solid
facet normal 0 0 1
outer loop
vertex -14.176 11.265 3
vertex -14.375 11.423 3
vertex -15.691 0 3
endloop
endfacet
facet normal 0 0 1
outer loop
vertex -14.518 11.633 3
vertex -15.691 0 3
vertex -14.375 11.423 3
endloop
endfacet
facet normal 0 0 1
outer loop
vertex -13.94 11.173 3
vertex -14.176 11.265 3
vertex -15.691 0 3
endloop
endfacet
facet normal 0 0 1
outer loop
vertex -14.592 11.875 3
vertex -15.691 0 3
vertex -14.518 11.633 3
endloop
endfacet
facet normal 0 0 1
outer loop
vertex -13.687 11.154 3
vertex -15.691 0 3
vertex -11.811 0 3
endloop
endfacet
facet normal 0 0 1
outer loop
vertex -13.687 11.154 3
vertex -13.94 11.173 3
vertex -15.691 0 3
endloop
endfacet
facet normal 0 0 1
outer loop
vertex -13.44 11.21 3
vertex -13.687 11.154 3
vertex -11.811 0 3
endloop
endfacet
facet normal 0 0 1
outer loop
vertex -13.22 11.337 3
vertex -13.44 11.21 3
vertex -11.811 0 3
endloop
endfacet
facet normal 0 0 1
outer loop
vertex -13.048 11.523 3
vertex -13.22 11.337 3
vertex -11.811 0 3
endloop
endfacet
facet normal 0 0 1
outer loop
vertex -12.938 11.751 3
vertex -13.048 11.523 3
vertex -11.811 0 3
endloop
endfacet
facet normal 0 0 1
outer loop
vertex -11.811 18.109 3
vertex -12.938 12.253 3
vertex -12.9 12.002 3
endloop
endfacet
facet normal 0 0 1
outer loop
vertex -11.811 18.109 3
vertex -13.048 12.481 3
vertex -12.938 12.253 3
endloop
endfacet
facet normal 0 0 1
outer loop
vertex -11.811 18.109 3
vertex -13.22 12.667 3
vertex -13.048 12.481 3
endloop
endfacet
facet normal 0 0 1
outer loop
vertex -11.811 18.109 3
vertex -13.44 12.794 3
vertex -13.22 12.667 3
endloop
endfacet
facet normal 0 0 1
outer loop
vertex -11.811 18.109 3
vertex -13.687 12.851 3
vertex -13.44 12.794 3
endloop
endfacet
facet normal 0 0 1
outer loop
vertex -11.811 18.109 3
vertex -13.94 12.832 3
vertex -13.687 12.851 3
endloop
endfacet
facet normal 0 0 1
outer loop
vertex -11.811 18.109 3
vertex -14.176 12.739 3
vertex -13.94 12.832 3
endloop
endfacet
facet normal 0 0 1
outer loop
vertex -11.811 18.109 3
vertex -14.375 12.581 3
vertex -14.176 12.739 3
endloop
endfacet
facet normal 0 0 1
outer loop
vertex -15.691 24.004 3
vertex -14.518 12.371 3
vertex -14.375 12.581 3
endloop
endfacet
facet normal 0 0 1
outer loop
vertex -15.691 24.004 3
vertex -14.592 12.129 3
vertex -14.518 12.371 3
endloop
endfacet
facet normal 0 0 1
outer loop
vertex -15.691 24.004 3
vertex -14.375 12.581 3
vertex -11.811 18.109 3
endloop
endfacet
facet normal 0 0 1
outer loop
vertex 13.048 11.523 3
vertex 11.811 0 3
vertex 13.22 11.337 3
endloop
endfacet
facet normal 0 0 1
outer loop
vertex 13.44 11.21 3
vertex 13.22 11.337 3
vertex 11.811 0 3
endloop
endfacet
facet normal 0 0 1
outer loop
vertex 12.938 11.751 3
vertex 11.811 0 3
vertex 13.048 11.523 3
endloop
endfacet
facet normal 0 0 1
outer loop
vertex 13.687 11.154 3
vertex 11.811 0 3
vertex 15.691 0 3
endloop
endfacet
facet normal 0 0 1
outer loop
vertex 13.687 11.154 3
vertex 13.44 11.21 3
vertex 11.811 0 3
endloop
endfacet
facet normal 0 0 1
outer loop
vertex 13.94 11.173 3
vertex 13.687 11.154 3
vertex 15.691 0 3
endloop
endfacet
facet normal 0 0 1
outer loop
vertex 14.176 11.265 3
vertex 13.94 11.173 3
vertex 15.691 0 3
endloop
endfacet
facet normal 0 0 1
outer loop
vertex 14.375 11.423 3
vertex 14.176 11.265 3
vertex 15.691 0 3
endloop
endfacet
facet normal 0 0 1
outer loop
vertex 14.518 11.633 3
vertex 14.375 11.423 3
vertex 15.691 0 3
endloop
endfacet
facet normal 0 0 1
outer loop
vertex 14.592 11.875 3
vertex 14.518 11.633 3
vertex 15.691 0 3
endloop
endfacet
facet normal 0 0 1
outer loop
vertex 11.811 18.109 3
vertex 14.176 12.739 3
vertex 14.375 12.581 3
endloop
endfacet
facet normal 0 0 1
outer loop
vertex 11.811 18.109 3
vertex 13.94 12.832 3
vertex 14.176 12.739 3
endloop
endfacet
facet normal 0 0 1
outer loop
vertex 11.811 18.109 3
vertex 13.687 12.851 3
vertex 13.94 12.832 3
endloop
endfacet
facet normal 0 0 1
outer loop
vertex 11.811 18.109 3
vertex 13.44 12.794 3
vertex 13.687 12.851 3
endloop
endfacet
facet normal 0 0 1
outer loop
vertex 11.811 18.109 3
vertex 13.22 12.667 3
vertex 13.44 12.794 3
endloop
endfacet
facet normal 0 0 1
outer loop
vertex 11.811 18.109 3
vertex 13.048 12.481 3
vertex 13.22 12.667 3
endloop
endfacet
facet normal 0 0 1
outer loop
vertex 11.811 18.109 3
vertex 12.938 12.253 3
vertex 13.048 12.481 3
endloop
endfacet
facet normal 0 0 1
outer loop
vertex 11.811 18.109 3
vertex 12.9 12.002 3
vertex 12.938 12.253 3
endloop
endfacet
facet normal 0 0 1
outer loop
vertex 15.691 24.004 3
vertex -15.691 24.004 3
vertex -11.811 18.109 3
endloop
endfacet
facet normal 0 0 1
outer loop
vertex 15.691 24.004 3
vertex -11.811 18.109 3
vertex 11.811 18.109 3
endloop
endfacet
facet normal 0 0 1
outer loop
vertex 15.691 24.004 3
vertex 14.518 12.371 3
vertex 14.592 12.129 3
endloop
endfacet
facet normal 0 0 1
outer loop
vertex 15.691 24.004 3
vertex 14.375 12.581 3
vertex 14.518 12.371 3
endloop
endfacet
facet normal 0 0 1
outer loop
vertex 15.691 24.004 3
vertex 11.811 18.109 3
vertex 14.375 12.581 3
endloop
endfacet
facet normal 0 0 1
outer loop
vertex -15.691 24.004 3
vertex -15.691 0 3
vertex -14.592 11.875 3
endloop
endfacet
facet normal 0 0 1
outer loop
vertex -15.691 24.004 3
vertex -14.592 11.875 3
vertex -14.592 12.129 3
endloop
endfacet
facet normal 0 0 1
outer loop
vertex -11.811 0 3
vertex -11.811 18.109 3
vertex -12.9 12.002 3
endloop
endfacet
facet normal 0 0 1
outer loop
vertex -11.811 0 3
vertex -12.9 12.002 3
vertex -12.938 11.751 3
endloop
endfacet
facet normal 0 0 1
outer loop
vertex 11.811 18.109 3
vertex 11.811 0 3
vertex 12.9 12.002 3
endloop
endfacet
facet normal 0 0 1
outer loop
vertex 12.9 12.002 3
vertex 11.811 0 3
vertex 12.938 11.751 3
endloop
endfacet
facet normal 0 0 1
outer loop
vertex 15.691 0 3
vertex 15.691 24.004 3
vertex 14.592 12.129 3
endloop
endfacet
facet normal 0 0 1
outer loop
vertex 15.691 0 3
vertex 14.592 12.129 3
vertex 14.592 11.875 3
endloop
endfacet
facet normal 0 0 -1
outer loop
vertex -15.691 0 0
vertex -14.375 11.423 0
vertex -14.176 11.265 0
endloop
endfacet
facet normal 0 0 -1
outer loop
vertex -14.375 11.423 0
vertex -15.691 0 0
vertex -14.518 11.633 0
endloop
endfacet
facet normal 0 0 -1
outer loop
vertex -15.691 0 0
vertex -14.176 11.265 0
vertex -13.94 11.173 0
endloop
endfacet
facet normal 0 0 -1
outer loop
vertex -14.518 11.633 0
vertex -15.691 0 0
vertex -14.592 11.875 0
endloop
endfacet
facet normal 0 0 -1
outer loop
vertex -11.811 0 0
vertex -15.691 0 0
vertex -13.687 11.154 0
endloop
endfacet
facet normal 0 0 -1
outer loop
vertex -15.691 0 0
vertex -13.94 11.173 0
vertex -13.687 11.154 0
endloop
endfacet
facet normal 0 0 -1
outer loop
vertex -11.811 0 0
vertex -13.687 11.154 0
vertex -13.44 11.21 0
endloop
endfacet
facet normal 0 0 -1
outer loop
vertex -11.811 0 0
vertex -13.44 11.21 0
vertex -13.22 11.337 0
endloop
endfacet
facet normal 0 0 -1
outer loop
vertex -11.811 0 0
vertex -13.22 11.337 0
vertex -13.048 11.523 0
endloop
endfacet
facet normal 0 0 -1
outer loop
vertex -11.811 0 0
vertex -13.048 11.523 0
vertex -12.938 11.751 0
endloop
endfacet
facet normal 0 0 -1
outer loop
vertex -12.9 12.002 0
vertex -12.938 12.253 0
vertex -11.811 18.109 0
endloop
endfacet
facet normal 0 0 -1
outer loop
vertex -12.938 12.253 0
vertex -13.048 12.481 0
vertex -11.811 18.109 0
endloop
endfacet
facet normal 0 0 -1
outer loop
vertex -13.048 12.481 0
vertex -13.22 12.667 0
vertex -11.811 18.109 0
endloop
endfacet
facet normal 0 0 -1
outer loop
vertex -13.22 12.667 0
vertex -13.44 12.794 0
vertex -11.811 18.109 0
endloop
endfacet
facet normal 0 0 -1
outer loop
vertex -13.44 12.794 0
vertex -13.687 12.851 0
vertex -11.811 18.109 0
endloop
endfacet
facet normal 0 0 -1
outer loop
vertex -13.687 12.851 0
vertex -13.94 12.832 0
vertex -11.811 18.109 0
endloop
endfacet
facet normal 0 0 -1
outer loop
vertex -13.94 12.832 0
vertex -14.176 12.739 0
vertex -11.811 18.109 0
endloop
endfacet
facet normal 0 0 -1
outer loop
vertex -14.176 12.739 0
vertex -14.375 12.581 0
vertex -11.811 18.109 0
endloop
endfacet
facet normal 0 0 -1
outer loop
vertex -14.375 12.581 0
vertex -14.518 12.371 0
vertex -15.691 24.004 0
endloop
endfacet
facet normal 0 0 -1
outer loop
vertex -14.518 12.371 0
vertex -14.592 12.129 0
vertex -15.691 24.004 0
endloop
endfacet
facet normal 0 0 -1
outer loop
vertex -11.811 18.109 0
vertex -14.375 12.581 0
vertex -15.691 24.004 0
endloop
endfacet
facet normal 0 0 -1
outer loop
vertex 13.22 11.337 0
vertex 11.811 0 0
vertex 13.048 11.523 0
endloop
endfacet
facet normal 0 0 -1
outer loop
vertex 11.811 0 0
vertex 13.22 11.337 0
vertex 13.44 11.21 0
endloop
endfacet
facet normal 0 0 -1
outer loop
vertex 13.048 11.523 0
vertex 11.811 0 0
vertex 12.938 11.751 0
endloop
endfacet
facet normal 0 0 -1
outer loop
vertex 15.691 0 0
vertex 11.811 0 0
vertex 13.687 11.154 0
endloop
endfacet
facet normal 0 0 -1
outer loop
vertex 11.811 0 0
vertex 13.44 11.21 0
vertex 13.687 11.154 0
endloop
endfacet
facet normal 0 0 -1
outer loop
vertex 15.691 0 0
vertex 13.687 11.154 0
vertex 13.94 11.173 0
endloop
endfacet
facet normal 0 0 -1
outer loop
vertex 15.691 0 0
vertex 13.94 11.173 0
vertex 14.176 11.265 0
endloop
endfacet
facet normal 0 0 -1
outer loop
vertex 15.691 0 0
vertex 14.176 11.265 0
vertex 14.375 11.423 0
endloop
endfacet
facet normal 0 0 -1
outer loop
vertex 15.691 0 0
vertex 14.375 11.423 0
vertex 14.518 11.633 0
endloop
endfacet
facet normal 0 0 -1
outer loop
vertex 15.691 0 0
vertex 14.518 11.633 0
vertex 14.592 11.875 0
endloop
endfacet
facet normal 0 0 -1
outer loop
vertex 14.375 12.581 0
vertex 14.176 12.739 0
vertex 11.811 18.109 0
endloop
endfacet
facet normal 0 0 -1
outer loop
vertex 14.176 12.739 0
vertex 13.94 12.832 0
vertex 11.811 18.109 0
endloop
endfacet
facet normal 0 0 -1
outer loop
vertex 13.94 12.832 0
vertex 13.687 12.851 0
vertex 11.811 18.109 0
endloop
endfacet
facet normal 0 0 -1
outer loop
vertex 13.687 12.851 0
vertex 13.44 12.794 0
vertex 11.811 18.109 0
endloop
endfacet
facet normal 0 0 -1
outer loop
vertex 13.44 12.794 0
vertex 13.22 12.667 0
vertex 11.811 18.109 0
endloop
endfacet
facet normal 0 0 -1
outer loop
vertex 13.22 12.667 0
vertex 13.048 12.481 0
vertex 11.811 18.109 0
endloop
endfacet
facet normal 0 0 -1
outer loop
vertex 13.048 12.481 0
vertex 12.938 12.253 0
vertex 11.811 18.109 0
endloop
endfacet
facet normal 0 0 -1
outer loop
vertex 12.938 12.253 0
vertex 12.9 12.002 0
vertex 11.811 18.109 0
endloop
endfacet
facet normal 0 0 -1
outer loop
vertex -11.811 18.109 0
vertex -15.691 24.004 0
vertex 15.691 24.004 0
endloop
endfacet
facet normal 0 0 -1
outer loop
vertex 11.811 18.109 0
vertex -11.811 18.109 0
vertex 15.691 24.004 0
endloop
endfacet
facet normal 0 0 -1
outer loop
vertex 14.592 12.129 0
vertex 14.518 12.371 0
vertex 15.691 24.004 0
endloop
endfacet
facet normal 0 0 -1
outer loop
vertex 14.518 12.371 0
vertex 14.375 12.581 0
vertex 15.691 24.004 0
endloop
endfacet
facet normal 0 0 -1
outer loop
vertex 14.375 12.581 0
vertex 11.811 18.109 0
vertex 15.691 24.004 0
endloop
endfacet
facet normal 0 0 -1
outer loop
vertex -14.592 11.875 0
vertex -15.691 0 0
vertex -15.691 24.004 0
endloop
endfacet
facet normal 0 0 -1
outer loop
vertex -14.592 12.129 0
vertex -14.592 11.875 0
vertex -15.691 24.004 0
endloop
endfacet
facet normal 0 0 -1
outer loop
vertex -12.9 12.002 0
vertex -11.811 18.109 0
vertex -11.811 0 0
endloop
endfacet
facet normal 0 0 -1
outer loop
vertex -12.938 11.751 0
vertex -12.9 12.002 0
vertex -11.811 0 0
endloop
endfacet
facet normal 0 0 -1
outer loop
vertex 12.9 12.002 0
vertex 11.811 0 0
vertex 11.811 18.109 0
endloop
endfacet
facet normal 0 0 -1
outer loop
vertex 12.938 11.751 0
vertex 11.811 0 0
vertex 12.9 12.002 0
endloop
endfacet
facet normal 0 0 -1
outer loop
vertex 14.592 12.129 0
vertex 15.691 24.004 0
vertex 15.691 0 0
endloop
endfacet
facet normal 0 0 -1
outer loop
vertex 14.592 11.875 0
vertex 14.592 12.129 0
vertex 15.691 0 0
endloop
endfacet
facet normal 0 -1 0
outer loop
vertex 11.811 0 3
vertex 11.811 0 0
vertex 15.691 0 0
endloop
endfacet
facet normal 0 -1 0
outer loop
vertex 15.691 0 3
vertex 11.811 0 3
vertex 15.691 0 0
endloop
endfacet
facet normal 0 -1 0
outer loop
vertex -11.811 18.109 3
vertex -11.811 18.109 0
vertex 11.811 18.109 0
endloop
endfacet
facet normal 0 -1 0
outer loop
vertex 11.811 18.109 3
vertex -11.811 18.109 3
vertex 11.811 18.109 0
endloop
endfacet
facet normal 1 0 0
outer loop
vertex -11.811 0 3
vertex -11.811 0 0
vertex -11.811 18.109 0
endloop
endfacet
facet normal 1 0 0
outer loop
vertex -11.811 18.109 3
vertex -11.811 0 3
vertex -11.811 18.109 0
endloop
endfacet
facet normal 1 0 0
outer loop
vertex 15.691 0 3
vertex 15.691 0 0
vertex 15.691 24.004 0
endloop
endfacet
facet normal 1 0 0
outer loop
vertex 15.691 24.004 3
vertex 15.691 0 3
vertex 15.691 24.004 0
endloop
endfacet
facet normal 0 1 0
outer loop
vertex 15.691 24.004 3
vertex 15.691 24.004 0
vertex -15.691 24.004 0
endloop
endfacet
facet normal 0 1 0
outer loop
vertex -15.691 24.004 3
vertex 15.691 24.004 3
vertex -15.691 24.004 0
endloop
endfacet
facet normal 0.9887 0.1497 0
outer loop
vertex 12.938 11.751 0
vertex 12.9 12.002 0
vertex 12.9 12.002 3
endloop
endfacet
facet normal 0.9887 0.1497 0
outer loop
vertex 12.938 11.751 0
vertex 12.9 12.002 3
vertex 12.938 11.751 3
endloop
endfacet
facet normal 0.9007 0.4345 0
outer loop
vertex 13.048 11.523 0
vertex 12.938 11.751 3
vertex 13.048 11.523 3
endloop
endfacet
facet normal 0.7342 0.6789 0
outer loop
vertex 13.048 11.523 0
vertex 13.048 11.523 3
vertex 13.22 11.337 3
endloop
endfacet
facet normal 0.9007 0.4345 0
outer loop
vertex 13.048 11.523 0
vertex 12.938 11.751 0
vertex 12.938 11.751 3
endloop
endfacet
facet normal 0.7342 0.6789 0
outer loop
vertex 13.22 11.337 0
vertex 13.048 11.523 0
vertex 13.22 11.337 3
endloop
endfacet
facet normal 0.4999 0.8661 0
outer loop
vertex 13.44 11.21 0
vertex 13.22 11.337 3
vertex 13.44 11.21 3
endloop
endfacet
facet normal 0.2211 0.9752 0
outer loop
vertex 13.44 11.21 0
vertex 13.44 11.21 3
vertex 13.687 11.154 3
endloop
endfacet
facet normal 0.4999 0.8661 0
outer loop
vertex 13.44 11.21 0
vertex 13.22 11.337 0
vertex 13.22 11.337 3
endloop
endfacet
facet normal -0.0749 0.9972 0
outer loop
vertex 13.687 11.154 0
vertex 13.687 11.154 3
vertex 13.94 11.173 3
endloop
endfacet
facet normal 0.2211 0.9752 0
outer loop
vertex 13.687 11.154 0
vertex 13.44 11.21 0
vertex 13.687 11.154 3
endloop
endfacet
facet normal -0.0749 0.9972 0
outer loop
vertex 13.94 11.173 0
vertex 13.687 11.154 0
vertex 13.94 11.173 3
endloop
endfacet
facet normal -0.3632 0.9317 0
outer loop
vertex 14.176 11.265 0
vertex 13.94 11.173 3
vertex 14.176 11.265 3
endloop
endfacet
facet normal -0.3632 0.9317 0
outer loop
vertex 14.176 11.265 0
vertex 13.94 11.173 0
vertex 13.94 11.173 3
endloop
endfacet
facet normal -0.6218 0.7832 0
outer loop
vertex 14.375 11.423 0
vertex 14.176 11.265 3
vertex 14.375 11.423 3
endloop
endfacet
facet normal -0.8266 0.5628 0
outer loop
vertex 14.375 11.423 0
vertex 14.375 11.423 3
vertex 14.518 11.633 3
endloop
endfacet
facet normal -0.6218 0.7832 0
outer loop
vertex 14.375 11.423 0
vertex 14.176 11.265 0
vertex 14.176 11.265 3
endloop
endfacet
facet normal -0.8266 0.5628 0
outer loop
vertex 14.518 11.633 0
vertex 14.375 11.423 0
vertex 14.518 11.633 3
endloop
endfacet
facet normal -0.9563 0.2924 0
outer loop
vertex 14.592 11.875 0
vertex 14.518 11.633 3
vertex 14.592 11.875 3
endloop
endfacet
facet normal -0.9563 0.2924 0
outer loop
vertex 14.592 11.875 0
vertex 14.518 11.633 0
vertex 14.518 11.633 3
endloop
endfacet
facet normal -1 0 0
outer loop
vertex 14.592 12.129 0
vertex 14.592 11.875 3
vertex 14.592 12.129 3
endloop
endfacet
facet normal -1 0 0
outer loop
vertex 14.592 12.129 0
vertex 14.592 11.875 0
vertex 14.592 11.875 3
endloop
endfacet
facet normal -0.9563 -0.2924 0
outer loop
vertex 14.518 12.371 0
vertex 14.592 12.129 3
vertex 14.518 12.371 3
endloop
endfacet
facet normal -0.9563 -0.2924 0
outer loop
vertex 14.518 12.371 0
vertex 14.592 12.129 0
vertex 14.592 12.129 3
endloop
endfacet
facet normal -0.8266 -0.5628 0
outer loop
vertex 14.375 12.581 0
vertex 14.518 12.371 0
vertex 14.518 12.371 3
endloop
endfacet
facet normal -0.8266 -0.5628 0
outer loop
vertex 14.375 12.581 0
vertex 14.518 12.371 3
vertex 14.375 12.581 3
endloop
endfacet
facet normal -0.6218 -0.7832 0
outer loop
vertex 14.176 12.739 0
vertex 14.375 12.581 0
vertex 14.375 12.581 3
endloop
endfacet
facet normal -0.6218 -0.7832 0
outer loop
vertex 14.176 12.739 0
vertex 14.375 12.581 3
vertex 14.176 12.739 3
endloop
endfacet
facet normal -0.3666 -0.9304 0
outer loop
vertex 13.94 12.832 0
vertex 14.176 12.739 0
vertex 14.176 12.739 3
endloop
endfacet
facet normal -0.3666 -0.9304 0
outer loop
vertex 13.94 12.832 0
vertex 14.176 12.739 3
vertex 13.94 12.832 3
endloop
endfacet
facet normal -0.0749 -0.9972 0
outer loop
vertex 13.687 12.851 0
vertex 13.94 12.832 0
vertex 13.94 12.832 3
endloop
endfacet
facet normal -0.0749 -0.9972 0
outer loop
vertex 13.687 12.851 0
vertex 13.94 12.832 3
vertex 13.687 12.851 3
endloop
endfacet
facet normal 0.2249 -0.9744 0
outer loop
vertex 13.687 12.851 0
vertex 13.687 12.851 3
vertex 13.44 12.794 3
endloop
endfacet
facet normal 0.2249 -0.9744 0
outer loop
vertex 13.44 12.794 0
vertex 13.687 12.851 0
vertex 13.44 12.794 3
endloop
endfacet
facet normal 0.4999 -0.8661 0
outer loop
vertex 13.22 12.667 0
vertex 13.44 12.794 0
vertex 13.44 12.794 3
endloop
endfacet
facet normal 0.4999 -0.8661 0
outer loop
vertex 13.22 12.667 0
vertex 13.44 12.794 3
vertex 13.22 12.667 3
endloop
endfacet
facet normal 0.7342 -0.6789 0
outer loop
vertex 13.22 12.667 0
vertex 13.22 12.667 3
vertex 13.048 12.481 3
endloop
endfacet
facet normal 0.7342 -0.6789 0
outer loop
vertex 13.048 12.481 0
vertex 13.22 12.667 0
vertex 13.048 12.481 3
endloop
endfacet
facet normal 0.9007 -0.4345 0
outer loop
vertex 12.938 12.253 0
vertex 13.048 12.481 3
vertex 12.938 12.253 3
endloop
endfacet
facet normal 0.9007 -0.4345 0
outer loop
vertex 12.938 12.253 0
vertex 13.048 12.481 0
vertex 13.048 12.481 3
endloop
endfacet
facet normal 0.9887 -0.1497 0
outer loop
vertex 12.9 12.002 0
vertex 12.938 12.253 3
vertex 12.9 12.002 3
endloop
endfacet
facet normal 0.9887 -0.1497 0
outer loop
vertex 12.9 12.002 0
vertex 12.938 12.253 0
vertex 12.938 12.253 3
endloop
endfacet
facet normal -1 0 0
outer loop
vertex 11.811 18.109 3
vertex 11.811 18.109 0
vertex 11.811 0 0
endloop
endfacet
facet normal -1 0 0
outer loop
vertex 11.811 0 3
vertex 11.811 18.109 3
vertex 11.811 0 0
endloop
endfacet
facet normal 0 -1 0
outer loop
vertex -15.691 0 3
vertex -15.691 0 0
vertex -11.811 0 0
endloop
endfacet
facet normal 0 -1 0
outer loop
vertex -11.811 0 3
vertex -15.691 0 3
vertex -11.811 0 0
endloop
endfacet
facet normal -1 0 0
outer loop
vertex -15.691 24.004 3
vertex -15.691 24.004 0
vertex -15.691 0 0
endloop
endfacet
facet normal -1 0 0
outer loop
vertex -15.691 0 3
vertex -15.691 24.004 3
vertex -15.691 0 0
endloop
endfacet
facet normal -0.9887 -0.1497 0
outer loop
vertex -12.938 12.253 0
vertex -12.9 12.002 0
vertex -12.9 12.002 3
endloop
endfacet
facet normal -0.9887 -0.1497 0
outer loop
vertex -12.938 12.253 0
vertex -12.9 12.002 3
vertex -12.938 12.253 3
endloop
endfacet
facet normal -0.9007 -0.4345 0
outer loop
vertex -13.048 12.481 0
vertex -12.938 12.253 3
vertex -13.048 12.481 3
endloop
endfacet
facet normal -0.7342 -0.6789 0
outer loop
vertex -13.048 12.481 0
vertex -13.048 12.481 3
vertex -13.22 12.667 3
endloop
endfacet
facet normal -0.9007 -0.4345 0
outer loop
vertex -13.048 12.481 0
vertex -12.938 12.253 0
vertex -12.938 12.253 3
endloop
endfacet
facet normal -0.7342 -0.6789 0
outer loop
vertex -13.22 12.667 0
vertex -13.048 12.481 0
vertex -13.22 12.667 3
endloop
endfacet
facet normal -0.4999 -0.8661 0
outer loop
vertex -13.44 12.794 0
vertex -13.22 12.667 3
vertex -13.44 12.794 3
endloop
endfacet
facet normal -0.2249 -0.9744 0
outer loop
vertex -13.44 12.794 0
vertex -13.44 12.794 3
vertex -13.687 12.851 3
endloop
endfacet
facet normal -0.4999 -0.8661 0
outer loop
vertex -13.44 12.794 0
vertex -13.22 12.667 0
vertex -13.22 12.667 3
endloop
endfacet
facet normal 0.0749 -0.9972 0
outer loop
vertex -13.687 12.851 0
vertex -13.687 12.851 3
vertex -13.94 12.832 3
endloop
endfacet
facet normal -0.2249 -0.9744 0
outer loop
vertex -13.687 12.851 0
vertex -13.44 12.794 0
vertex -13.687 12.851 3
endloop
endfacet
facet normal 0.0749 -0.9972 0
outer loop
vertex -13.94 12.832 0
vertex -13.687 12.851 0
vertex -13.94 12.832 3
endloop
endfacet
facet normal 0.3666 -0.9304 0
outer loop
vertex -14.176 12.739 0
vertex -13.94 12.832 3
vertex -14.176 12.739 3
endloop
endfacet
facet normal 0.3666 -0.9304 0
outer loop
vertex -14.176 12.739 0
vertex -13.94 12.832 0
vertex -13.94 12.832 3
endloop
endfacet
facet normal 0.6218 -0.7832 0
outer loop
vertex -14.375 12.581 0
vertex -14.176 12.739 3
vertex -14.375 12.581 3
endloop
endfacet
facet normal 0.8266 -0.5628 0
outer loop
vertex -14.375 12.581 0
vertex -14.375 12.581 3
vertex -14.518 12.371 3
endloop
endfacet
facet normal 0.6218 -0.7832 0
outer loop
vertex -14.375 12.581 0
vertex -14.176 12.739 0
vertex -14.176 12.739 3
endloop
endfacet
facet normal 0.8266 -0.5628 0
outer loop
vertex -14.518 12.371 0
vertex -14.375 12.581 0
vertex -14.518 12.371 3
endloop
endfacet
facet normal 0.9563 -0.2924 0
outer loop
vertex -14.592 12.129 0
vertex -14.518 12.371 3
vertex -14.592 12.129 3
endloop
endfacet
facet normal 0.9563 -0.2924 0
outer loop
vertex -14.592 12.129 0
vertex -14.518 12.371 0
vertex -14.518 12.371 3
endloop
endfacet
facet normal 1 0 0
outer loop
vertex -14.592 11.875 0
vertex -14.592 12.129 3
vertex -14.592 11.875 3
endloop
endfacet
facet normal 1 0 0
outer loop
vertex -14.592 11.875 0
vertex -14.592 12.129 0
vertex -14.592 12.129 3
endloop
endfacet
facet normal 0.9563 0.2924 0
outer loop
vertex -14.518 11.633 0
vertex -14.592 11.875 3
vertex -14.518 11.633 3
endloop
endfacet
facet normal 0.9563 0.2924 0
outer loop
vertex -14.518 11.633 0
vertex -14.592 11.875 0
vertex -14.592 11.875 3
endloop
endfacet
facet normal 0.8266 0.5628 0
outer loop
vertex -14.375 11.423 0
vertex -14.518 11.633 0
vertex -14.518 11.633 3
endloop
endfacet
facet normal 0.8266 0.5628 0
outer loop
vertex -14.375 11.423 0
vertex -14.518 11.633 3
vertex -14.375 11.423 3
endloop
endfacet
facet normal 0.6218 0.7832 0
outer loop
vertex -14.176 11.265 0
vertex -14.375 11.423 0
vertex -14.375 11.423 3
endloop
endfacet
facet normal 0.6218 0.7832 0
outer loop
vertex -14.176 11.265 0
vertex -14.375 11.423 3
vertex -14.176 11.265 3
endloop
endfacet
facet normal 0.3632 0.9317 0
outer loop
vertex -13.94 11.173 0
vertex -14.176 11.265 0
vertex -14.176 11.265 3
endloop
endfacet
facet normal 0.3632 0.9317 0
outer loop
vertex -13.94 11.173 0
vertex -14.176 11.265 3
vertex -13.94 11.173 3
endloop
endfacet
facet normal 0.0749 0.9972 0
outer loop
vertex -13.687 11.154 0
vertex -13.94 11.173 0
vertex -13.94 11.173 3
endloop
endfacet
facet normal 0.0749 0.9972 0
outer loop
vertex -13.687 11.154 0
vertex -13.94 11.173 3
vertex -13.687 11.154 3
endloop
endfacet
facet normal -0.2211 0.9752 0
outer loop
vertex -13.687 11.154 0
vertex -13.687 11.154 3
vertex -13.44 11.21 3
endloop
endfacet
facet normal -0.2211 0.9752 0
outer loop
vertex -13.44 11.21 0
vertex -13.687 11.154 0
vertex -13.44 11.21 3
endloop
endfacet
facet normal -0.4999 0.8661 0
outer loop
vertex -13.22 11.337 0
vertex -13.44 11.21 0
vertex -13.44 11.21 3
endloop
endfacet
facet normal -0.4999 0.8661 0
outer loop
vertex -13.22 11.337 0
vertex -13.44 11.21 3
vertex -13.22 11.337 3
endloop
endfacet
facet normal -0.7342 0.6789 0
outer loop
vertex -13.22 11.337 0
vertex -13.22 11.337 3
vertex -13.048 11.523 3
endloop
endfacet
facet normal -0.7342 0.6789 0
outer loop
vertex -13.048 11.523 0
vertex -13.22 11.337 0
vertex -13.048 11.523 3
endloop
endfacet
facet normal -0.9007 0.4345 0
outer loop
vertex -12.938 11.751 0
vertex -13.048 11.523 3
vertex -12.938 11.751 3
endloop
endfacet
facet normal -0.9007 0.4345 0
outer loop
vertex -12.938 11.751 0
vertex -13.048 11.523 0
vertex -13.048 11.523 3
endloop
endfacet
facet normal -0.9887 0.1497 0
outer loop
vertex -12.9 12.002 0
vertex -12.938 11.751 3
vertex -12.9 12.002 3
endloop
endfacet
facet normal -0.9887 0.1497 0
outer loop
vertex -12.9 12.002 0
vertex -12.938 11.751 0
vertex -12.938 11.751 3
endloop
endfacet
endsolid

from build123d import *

# Parameters (mm, degrees)
SKETCH1_R           = 0.8509
BOSS_EXTRUDE1_DEPTH = 3


with BuildPart() as part:
    # Sketch1 → Boss-Extrude1 (new body)
    with BuildSketch(Plane.XY):
        Polygon((15.691, 24.0041), (-15.691, 24.0041), (-15.691, 0), (-11.811, 0), (-11.811, 18.1091), (11.811, 18.1091), (11.811, 0), (15.691, 0), align=None)
        with Locations((-13.751, 12.0021)):
            Circle(SKETCH1_R, mode=Mode.SUBTRACT)
        with Locations(Location((13.751, 12.0021, 0), (0, 0, 180))):
            Circle(SKETCH1_R, mode=Mode.SUBTRACT)
    extrude(amount=BOSS_EXTRUDE1_DEPTH)


solid = part.part
